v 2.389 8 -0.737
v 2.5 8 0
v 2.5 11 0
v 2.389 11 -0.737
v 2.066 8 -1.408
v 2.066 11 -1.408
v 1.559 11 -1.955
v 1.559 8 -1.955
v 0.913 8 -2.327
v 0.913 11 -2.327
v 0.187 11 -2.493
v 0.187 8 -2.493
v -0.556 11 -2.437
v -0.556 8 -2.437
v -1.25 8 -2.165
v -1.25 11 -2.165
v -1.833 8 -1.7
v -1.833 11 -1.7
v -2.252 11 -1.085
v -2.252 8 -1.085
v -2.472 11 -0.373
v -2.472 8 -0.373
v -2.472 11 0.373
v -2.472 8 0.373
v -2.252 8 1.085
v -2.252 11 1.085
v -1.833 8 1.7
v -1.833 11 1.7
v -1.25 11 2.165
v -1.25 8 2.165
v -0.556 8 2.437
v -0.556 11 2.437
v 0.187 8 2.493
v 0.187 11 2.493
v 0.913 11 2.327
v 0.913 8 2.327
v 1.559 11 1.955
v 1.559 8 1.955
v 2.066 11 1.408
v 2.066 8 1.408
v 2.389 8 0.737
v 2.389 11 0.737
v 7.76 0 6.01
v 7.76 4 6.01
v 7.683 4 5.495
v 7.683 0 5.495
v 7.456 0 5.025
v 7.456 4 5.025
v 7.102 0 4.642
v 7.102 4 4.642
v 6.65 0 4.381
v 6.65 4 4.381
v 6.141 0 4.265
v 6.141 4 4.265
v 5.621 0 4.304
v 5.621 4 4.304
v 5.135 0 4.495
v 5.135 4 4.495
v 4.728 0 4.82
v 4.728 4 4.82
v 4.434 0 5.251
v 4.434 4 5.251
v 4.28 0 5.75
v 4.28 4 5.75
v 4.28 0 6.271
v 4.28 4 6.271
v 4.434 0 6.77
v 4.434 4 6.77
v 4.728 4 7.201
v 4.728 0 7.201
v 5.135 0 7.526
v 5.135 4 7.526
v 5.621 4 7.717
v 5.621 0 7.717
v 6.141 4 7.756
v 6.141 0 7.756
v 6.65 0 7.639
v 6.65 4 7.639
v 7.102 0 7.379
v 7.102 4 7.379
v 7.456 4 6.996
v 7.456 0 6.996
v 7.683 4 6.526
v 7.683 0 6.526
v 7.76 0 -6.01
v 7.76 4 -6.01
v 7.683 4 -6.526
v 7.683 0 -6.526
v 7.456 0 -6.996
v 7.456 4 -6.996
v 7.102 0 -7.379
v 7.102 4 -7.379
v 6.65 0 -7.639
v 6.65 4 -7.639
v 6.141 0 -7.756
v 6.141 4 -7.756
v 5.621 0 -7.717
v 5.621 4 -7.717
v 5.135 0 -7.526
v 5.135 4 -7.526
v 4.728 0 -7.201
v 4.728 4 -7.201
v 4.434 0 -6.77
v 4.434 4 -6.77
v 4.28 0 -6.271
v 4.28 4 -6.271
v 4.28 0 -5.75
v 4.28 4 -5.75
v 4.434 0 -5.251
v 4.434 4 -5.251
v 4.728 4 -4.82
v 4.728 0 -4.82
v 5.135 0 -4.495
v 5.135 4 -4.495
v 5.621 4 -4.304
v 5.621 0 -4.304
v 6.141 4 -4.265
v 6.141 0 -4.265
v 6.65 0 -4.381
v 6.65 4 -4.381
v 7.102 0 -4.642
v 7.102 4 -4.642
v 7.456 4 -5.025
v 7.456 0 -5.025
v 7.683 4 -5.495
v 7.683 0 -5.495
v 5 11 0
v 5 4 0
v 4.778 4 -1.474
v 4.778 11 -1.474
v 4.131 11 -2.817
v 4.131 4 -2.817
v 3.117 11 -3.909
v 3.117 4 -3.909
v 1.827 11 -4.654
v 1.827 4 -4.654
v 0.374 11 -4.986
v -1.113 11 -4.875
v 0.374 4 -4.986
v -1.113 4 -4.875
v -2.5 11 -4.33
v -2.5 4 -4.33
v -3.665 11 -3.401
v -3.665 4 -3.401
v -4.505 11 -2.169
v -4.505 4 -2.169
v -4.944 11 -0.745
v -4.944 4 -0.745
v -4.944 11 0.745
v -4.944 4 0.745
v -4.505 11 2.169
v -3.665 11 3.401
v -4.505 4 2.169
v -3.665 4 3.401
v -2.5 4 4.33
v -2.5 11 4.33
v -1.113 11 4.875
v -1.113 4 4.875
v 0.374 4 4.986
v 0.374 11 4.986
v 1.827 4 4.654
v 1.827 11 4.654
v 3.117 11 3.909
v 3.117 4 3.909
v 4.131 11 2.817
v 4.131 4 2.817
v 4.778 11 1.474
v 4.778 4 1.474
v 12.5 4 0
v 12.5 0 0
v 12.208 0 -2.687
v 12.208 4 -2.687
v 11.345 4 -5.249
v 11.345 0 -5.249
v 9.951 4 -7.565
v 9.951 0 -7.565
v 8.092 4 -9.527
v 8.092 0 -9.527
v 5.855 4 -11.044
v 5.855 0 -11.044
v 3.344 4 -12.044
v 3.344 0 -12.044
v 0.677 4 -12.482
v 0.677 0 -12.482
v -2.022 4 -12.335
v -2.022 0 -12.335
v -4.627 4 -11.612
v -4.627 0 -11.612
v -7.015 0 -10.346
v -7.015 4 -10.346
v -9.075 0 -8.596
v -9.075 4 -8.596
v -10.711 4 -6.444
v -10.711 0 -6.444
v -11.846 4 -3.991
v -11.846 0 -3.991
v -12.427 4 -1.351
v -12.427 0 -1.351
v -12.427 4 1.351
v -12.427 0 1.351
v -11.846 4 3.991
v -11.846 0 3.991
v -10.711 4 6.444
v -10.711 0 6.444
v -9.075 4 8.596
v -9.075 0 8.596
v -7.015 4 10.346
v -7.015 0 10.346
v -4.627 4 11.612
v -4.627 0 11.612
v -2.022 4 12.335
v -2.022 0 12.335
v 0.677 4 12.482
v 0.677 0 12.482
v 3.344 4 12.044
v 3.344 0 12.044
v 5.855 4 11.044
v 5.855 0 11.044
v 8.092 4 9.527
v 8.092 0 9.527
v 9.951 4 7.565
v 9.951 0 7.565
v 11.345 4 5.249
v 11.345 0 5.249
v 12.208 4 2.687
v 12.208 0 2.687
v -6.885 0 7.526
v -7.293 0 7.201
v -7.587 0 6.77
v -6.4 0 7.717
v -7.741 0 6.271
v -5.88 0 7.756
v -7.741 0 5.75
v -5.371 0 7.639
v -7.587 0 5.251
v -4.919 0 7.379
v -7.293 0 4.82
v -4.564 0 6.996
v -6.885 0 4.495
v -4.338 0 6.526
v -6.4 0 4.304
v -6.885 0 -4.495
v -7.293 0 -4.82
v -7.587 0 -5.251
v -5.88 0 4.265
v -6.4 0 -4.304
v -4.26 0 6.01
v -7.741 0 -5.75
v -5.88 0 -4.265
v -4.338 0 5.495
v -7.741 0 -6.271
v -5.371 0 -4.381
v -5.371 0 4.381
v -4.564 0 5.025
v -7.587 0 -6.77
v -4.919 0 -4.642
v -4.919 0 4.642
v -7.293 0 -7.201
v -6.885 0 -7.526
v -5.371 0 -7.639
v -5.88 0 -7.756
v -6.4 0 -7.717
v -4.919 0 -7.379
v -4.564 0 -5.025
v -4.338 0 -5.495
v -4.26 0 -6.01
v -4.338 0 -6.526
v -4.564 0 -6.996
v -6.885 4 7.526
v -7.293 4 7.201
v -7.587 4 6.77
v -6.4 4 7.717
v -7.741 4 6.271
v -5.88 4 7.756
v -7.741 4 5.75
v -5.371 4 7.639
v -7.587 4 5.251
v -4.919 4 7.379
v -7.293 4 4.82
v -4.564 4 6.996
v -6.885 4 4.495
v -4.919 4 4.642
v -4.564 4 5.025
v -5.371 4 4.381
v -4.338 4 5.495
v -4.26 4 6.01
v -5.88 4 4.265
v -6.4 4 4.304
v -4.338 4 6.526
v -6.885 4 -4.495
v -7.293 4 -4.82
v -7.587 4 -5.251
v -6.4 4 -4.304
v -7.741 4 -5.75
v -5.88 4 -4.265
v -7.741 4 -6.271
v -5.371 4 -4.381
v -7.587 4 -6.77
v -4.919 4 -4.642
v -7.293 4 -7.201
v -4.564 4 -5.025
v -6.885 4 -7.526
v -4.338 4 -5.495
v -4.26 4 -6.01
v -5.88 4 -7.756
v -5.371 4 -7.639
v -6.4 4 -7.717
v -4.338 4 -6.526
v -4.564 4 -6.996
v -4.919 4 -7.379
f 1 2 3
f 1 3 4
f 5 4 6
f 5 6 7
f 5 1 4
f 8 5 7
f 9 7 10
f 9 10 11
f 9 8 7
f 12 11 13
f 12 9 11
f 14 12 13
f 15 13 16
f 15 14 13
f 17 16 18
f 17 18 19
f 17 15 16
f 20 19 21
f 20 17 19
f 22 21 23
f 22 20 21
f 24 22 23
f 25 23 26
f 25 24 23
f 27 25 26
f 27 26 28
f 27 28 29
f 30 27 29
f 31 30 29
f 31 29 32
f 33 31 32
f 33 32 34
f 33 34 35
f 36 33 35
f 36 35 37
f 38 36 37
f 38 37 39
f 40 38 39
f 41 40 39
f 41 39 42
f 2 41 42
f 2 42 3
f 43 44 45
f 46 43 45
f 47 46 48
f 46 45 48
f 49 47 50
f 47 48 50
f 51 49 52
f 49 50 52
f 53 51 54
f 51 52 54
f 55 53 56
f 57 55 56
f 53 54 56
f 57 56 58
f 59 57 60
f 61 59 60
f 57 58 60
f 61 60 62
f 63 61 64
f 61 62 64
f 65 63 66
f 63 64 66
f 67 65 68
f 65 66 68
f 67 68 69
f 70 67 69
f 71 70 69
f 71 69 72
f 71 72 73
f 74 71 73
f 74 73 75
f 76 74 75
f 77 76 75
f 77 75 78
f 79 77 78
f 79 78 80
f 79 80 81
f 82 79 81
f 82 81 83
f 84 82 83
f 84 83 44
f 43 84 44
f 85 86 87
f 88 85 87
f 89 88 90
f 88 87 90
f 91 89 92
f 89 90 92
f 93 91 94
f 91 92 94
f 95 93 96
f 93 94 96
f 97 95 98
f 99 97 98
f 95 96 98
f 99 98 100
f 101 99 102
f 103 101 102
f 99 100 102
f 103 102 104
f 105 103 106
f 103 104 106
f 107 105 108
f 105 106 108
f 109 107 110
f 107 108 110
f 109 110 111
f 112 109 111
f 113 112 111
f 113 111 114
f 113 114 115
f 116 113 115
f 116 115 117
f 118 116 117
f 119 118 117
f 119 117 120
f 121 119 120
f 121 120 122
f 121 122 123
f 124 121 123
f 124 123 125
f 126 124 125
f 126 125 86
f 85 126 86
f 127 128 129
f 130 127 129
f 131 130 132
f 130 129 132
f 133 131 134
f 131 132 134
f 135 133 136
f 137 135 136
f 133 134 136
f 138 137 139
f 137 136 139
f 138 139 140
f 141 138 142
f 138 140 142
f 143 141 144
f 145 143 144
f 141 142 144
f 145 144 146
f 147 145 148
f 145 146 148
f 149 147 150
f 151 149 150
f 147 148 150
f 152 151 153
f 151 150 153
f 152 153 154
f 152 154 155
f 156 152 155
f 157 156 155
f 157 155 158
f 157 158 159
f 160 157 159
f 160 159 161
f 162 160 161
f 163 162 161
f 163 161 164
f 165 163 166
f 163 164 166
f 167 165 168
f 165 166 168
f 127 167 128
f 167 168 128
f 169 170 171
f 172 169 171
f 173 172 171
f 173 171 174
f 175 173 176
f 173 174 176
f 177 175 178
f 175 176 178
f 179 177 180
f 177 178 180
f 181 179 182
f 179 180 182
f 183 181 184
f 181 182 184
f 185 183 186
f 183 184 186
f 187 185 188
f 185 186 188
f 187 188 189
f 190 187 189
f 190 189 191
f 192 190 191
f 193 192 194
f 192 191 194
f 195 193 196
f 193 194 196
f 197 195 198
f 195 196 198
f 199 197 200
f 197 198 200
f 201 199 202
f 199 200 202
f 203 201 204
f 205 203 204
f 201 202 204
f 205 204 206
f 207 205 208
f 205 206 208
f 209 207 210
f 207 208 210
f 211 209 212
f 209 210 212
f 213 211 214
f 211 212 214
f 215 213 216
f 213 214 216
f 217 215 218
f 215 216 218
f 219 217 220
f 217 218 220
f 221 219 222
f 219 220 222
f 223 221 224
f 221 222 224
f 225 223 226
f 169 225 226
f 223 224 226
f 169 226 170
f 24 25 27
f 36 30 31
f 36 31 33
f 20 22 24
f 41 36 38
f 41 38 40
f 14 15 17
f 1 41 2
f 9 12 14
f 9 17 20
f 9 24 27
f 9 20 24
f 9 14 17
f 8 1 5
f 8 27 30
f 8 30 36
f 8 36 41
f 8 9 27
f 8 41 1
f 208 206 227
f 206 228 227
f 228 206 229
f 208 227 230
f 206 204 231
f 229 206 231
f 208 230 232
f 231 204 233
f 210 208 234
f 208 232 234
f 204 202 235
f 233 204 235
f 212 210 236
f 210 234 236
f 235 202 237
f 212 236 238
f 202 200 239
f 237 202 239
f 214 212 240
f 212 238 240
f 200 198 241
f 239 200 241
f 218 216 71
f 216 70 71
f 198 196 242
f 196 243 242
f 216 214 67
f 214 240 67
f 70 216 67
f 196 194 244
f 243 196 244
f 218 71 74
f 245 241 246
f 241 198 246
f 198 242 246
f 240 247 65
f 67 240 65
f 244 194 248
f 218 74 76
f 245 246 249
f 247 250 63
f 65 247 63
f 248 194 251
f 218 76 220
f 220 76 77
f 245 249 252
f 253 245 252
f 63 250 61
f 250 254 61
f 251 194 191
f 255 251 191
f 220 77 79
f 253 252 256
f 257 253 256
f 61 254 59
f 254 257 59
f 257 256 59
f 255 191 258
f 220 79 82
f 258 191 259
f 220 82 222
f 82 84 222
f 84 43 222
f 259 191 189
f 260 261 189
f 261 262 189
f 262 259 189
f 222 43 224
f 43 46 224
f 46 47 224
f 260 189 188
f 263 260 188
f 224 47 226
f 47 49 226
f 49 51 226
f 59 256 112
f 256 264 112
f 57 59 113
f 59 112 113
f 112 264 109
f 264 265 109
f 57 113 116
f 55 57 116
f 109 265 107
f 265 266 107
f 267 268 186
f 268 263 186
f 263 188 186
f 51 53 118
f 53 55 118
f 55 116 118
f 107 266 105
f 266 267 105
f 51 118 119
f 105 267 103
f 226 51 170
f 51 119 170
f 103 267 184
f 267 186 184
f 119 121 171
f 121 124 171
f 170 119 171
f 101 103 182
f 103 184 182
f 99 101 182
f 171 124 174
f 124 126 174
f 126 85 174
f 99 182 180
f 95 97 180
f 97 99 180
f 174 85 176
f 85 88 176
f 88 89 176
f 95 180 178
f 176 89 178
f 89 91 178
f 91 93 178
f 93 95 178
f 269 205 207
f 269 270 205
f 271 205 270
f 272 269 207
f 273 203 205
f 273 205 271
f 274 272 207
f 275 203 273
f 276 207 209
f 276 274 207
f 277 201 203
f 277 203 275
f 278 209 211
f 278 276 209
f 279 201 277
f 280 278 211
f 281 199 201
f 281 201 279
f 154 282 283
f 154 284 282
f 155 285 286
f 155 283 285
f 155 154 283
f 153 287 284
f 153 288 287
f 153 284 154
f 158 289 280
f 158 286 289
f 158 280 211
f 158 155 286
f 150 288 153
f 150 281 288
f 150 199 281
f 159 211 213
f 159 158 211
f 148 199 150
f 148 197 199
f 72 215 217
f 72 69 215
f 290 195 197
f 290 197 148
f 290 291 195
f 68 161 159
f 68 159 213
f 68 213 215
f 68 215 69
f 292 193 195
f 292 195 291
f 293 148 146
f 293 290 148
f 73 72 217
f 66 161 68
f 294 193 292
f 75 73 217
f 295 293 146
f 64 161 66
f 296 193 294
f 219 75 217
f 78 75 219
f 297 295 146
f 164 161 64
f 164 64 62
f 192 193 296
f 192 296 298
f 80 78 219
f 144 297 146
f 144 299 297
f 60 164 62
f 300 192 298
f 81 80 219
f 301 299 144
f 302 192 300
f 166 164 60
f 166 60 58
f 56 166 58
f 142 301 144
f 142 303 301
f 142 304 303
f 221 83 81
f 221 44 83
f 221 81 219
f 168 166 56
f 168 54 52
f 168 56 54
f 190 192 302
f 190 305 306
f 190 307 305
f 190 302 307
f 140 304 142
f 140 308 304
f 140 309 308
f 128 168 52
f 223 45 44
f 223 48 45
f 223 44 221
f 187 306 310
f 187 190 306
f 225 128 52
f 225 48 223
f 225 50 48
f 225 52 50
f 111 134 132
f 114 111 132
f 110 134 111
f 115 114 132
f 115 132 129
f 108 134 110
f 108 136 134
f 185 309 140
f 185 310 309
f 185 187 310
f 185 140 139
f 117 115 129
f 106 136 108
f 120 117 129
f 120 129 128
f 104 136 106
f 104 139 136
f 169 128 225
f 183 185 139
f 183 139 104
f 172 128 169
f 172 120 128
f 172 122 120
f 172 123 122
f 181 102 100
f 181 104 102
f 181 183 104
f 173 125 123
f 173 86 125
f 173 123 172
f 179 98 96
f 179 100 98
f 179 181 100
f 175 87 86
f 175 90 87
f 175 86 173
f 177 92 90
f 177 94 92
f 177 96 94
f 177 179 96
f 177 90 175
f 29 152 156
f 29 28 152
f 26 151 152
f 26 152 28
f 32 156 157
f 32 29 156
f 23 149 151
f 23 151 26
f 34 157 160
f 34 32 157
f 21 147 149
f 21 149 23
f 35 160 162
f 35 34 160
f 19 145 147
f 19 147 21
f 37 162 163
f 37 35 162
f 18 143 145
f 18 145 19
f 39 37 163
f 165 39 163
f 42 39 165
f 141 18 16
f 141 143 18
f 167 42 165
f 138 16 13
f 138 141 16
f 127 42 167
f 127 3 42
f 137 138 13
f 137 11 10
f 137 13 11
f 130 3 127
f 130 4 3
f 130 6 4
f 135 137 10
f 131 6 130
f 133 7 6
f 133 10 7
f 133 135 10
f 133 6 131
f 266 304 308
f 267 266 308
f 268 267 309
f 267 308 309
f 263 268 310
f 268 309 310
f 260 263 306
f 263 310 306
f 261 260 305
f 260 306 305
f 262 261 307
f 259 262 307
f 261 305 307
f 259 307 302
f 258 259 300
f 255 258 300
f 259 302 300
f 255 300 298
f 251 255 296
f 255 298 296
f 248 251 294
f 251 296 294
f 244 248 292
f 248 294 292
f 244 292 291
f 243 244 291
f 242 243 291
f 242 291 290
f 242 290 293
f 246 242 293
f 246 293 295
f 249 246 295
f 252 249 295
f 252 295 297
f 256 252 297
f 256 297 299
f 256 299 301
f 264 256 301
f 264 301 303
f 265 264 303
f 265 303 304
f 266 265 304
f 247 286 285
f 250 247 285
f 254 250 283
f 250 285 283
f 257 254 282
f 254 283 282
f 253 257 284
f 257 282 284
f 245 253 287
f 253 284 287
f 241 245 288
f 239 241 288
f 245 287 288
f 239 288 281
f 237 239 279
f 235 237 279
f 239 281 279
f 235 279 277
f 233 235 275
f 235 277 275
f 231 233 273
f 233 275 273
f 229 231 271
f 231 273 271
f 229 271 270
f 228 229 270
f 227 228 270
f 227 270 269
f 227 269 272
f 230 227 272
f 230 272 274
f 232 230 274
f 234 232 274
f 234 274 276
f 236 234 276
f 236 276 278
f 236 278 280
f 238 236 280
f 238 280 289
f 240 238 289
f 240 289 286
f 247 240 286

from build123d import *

# Parameters (mm, degrees)
SKETCH1_R           = 12.5
BOSS_EXTRUDE1_DEPTH = 4
SKETCH2_R           = 5
SKETCH2_R_2         = 2.5
BOSS_EXTRUDE2_DEPTH = 7
CUT_EXTRUDE1_REACH  = 21.013
SKETCH3_R           = 1.75
SKETCH2_2_R         = 2.5
BOSS_EXTRUDE3_DEPTH = 4


with BuildPart() as part:
    # Sketch1 → Boss-Extrude1 (new body)
    with BuildSketch(Plane(origin=(0, 0, 0), x_dir=(1, 0, 0), z_dir=(0, 1, 0))):
        Circle(SKETCH1_R)
    extrude(amount=BOSS_EXTRUDE1_DEPTH)

    # Sketch2 → Boss-Extrude2 (add)
    with BuildSketch(Plane(origin=(0, 4, 0), x_dir=(1, 0, 0), z_dir=(0, 1, 0))):
        Circle(SKETCH2_R)
        Circle(SKETCH2_R_2, mode=Mode.SUBTRACT)
    extrude(amount=BOSS_EXTRUDE2_DEPTH)

    # Sketch3 → Cut-Extrude1 (cut, up to next)
    with BuildSketch(Plane(origin=(0, 4, 0), x_dir=(1, 0, 0), z_dir=(0, 1, 0)), mode=Mode.PRIVATE) as cut_extrude1_sk1:
        with Locations((-6.01040764, 6.01040764)):
            Circle(SKETCH3_R)
    cut_extrude1_tool1 = extrude(cut_extrude1_sk1.sketch, amount=-CUT_EXTRUDE1_REACH, mode=Mode.PRIVATE) & part.part
    # Sketch3 → Cut-Extrude1 (cut, up to next)
    with BuildSketch(Plane(origin=(0, 4, 0), x_dir=(1, 0, 0), z_dir=(0, 1, 0)), mode=Mode.PRIVATE) as cut_extrude1_sk2:
        with Locations((6.01040764, 6.01040764)):
            Circle(SKETCH3_R)
    cut_extrude1_tool2 = extrude(cut_extrude1_sk2.sketch, amount=-CUT_EXTRUDE1_REACH, mode=Mode.PRIVATE) & part.part
    # Sketch3 → Cut-Extrude1 (cut, up to next)
    with BuildSketch(Plane(origin=(0, 4, 0), x_dir=(1, 0, 0), z_dir=(0, 1, 0)), mode=Mode.PRIVATE) as cut_extrude1_sk3:
        with Locations((6.01040764, -6.01040764)):
            Circle(SKETCH3_R)
    cut_extrude1_tool3 = extrude(cut_extrude1_sk3.sketch, amount=-CUT_EXTRUDE1_REACH, mode=Mode.PRIVATE) & part.part
    # Sketch3 → Cut-Extrude1 (cut, up to next)
    with BuildSketch(Plane(origin=(0, 4, 0), x_dir=(1, 0, 0), z_dir=(0, 1, 0)), mode=Mode.PRIVATE) as cut_extrude1_sk4:
        with Locations((-6.01040764, -6.01040764)):
            Circle(SKETCH3_R)
    cut_extrude1_tool4 = extrude(cut_extrude1_sk4.sketch, amount=-CUT_EXTRUDE1_REACH, mode=Mode.PRIVATE) & part.part
    add(cut_extrude1_tool1.solids().sort_by_distance((-6.010408, 4, -6.010408))[0], mode=Mode.SUBTRACT)
    add(cut_extrude1_tool2.solids().sort_by_distance((6.010408, 4, -6.010408))[0], mode=Mode.SUBTRACT)
    add(cut_extrude1_tool3.solids().sort_by_distance((6.010408, 4, 6.010408))[0], mode=Mode.SUBTRACT)
    add(cut_extrude1_tool4.solids().sort_by_distance((-6.010408, 4, 6.010408))[0], mode=Mode.SUBTRACT)

    # Sketch2<2> → Boss-Extrude3 (add)
    with BuildSketch(Plane(origin=(0, 4, 0), x_dir=(1, 0, 0), z_dir=(0, 1, 0))):
        Circle(SKETCH2_2_R)
    extrude(amount=BOSS_EXTRUDE3_DEPTH)


solid = part.part
